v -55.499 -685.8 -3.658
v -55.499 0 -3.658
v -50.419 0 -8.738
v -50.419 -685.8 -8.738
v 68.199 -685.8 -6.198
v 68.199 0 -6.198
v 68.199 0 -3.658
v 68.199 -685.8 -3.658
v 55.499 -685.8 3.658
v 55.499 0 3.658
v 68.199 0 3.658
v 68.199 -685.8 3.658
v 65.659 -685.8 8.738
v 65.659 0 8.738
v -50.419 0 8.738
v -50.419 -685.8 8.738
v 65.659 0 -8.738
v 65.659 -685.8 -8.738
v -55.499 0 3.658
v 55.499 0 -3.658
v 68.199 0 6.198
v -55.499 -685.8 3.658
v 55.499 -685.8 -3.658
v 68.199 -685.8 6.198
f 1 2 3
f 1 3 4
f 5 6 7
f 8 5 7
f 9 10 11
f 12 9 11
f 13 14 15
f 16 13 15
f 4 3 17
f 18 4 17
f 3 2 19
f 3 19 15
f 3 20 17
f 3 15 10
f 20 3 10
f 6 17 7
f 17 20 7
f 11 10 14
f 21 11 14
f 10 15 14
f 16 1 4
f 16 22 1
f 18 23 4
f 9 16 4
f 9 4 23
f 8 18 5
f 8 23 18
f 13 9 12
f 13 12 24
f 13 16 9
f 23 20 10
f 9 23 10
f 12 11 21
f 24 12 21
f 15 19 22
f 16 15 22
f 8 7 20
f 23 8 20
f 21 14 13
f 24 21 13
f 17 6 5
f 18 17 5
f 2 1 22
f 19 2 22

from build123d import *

# Parameters (mm, degrees)
F1_DEPTH = 685.8
F2_SIZE  = 2.54
F3_SIZE  = 5.07999
F4_W     = 25.4
F4_H     = 7.3152
F5_DEPTH = 685.801


# Not quite as in the source:
# - a fillet or chamfer is up to 0.001 mm smaller than in the source, because OpenCascade refuses the exact size


with BuildPart() as f1:
    # F0 (on Front) → F1 (new body)
    with BuildSketch(Plane.XZ):
        Polygon((68.199, 3.6576), (68.199, 8.7376), (-55.499, 8.7376), (-55.499, 3.6576), (-68.199, 3.6576), (-68.199, -3.6576), (-55.499, -3.6576), (-55.499, -8.7376), (68.199, -8.7376), (68.199, -3.6576), (55.499, -3.6576), (55.499, 3.6576), align=None)
    extrude(amount=F1_DEPTH)

    # F2
    f2_edges = [f1.edges().sort_by_distance(p)[0] for p in [
        (68.199, -342.9, 8.7376),
        (68.199, -342.9, -8.7376),
        (-68.199, -342.9, 3.6576),
        (-68.199, -342.9, -3.6576),
    ]]
    chamfer(f2_edges, length=F2_SIZE)

    # F3 (size 5.08 in the source; OpenCascade refuses exactly that, so slightly less here)
    f3_edges = [f1.edges().sort_by_distance(p)[0] for p in [
        (-55.499, -342.9, 8.7376),
        (-55.499, -342.9, -8.7376),
    ]]
    chamfer(f3_edges, length=F3_SIZE)

    # F4 (on face) → F5 (cut, through all)
    with BuildSketch(Plane.XZ.offset(685.8)):
        with Locations((-68.199, 0)):
            Rectangle(F4_W, F4_H)
    extrude(amount=-F5_DEPTH, mode=Mode.SUBTRACT)


solid = f1.part
